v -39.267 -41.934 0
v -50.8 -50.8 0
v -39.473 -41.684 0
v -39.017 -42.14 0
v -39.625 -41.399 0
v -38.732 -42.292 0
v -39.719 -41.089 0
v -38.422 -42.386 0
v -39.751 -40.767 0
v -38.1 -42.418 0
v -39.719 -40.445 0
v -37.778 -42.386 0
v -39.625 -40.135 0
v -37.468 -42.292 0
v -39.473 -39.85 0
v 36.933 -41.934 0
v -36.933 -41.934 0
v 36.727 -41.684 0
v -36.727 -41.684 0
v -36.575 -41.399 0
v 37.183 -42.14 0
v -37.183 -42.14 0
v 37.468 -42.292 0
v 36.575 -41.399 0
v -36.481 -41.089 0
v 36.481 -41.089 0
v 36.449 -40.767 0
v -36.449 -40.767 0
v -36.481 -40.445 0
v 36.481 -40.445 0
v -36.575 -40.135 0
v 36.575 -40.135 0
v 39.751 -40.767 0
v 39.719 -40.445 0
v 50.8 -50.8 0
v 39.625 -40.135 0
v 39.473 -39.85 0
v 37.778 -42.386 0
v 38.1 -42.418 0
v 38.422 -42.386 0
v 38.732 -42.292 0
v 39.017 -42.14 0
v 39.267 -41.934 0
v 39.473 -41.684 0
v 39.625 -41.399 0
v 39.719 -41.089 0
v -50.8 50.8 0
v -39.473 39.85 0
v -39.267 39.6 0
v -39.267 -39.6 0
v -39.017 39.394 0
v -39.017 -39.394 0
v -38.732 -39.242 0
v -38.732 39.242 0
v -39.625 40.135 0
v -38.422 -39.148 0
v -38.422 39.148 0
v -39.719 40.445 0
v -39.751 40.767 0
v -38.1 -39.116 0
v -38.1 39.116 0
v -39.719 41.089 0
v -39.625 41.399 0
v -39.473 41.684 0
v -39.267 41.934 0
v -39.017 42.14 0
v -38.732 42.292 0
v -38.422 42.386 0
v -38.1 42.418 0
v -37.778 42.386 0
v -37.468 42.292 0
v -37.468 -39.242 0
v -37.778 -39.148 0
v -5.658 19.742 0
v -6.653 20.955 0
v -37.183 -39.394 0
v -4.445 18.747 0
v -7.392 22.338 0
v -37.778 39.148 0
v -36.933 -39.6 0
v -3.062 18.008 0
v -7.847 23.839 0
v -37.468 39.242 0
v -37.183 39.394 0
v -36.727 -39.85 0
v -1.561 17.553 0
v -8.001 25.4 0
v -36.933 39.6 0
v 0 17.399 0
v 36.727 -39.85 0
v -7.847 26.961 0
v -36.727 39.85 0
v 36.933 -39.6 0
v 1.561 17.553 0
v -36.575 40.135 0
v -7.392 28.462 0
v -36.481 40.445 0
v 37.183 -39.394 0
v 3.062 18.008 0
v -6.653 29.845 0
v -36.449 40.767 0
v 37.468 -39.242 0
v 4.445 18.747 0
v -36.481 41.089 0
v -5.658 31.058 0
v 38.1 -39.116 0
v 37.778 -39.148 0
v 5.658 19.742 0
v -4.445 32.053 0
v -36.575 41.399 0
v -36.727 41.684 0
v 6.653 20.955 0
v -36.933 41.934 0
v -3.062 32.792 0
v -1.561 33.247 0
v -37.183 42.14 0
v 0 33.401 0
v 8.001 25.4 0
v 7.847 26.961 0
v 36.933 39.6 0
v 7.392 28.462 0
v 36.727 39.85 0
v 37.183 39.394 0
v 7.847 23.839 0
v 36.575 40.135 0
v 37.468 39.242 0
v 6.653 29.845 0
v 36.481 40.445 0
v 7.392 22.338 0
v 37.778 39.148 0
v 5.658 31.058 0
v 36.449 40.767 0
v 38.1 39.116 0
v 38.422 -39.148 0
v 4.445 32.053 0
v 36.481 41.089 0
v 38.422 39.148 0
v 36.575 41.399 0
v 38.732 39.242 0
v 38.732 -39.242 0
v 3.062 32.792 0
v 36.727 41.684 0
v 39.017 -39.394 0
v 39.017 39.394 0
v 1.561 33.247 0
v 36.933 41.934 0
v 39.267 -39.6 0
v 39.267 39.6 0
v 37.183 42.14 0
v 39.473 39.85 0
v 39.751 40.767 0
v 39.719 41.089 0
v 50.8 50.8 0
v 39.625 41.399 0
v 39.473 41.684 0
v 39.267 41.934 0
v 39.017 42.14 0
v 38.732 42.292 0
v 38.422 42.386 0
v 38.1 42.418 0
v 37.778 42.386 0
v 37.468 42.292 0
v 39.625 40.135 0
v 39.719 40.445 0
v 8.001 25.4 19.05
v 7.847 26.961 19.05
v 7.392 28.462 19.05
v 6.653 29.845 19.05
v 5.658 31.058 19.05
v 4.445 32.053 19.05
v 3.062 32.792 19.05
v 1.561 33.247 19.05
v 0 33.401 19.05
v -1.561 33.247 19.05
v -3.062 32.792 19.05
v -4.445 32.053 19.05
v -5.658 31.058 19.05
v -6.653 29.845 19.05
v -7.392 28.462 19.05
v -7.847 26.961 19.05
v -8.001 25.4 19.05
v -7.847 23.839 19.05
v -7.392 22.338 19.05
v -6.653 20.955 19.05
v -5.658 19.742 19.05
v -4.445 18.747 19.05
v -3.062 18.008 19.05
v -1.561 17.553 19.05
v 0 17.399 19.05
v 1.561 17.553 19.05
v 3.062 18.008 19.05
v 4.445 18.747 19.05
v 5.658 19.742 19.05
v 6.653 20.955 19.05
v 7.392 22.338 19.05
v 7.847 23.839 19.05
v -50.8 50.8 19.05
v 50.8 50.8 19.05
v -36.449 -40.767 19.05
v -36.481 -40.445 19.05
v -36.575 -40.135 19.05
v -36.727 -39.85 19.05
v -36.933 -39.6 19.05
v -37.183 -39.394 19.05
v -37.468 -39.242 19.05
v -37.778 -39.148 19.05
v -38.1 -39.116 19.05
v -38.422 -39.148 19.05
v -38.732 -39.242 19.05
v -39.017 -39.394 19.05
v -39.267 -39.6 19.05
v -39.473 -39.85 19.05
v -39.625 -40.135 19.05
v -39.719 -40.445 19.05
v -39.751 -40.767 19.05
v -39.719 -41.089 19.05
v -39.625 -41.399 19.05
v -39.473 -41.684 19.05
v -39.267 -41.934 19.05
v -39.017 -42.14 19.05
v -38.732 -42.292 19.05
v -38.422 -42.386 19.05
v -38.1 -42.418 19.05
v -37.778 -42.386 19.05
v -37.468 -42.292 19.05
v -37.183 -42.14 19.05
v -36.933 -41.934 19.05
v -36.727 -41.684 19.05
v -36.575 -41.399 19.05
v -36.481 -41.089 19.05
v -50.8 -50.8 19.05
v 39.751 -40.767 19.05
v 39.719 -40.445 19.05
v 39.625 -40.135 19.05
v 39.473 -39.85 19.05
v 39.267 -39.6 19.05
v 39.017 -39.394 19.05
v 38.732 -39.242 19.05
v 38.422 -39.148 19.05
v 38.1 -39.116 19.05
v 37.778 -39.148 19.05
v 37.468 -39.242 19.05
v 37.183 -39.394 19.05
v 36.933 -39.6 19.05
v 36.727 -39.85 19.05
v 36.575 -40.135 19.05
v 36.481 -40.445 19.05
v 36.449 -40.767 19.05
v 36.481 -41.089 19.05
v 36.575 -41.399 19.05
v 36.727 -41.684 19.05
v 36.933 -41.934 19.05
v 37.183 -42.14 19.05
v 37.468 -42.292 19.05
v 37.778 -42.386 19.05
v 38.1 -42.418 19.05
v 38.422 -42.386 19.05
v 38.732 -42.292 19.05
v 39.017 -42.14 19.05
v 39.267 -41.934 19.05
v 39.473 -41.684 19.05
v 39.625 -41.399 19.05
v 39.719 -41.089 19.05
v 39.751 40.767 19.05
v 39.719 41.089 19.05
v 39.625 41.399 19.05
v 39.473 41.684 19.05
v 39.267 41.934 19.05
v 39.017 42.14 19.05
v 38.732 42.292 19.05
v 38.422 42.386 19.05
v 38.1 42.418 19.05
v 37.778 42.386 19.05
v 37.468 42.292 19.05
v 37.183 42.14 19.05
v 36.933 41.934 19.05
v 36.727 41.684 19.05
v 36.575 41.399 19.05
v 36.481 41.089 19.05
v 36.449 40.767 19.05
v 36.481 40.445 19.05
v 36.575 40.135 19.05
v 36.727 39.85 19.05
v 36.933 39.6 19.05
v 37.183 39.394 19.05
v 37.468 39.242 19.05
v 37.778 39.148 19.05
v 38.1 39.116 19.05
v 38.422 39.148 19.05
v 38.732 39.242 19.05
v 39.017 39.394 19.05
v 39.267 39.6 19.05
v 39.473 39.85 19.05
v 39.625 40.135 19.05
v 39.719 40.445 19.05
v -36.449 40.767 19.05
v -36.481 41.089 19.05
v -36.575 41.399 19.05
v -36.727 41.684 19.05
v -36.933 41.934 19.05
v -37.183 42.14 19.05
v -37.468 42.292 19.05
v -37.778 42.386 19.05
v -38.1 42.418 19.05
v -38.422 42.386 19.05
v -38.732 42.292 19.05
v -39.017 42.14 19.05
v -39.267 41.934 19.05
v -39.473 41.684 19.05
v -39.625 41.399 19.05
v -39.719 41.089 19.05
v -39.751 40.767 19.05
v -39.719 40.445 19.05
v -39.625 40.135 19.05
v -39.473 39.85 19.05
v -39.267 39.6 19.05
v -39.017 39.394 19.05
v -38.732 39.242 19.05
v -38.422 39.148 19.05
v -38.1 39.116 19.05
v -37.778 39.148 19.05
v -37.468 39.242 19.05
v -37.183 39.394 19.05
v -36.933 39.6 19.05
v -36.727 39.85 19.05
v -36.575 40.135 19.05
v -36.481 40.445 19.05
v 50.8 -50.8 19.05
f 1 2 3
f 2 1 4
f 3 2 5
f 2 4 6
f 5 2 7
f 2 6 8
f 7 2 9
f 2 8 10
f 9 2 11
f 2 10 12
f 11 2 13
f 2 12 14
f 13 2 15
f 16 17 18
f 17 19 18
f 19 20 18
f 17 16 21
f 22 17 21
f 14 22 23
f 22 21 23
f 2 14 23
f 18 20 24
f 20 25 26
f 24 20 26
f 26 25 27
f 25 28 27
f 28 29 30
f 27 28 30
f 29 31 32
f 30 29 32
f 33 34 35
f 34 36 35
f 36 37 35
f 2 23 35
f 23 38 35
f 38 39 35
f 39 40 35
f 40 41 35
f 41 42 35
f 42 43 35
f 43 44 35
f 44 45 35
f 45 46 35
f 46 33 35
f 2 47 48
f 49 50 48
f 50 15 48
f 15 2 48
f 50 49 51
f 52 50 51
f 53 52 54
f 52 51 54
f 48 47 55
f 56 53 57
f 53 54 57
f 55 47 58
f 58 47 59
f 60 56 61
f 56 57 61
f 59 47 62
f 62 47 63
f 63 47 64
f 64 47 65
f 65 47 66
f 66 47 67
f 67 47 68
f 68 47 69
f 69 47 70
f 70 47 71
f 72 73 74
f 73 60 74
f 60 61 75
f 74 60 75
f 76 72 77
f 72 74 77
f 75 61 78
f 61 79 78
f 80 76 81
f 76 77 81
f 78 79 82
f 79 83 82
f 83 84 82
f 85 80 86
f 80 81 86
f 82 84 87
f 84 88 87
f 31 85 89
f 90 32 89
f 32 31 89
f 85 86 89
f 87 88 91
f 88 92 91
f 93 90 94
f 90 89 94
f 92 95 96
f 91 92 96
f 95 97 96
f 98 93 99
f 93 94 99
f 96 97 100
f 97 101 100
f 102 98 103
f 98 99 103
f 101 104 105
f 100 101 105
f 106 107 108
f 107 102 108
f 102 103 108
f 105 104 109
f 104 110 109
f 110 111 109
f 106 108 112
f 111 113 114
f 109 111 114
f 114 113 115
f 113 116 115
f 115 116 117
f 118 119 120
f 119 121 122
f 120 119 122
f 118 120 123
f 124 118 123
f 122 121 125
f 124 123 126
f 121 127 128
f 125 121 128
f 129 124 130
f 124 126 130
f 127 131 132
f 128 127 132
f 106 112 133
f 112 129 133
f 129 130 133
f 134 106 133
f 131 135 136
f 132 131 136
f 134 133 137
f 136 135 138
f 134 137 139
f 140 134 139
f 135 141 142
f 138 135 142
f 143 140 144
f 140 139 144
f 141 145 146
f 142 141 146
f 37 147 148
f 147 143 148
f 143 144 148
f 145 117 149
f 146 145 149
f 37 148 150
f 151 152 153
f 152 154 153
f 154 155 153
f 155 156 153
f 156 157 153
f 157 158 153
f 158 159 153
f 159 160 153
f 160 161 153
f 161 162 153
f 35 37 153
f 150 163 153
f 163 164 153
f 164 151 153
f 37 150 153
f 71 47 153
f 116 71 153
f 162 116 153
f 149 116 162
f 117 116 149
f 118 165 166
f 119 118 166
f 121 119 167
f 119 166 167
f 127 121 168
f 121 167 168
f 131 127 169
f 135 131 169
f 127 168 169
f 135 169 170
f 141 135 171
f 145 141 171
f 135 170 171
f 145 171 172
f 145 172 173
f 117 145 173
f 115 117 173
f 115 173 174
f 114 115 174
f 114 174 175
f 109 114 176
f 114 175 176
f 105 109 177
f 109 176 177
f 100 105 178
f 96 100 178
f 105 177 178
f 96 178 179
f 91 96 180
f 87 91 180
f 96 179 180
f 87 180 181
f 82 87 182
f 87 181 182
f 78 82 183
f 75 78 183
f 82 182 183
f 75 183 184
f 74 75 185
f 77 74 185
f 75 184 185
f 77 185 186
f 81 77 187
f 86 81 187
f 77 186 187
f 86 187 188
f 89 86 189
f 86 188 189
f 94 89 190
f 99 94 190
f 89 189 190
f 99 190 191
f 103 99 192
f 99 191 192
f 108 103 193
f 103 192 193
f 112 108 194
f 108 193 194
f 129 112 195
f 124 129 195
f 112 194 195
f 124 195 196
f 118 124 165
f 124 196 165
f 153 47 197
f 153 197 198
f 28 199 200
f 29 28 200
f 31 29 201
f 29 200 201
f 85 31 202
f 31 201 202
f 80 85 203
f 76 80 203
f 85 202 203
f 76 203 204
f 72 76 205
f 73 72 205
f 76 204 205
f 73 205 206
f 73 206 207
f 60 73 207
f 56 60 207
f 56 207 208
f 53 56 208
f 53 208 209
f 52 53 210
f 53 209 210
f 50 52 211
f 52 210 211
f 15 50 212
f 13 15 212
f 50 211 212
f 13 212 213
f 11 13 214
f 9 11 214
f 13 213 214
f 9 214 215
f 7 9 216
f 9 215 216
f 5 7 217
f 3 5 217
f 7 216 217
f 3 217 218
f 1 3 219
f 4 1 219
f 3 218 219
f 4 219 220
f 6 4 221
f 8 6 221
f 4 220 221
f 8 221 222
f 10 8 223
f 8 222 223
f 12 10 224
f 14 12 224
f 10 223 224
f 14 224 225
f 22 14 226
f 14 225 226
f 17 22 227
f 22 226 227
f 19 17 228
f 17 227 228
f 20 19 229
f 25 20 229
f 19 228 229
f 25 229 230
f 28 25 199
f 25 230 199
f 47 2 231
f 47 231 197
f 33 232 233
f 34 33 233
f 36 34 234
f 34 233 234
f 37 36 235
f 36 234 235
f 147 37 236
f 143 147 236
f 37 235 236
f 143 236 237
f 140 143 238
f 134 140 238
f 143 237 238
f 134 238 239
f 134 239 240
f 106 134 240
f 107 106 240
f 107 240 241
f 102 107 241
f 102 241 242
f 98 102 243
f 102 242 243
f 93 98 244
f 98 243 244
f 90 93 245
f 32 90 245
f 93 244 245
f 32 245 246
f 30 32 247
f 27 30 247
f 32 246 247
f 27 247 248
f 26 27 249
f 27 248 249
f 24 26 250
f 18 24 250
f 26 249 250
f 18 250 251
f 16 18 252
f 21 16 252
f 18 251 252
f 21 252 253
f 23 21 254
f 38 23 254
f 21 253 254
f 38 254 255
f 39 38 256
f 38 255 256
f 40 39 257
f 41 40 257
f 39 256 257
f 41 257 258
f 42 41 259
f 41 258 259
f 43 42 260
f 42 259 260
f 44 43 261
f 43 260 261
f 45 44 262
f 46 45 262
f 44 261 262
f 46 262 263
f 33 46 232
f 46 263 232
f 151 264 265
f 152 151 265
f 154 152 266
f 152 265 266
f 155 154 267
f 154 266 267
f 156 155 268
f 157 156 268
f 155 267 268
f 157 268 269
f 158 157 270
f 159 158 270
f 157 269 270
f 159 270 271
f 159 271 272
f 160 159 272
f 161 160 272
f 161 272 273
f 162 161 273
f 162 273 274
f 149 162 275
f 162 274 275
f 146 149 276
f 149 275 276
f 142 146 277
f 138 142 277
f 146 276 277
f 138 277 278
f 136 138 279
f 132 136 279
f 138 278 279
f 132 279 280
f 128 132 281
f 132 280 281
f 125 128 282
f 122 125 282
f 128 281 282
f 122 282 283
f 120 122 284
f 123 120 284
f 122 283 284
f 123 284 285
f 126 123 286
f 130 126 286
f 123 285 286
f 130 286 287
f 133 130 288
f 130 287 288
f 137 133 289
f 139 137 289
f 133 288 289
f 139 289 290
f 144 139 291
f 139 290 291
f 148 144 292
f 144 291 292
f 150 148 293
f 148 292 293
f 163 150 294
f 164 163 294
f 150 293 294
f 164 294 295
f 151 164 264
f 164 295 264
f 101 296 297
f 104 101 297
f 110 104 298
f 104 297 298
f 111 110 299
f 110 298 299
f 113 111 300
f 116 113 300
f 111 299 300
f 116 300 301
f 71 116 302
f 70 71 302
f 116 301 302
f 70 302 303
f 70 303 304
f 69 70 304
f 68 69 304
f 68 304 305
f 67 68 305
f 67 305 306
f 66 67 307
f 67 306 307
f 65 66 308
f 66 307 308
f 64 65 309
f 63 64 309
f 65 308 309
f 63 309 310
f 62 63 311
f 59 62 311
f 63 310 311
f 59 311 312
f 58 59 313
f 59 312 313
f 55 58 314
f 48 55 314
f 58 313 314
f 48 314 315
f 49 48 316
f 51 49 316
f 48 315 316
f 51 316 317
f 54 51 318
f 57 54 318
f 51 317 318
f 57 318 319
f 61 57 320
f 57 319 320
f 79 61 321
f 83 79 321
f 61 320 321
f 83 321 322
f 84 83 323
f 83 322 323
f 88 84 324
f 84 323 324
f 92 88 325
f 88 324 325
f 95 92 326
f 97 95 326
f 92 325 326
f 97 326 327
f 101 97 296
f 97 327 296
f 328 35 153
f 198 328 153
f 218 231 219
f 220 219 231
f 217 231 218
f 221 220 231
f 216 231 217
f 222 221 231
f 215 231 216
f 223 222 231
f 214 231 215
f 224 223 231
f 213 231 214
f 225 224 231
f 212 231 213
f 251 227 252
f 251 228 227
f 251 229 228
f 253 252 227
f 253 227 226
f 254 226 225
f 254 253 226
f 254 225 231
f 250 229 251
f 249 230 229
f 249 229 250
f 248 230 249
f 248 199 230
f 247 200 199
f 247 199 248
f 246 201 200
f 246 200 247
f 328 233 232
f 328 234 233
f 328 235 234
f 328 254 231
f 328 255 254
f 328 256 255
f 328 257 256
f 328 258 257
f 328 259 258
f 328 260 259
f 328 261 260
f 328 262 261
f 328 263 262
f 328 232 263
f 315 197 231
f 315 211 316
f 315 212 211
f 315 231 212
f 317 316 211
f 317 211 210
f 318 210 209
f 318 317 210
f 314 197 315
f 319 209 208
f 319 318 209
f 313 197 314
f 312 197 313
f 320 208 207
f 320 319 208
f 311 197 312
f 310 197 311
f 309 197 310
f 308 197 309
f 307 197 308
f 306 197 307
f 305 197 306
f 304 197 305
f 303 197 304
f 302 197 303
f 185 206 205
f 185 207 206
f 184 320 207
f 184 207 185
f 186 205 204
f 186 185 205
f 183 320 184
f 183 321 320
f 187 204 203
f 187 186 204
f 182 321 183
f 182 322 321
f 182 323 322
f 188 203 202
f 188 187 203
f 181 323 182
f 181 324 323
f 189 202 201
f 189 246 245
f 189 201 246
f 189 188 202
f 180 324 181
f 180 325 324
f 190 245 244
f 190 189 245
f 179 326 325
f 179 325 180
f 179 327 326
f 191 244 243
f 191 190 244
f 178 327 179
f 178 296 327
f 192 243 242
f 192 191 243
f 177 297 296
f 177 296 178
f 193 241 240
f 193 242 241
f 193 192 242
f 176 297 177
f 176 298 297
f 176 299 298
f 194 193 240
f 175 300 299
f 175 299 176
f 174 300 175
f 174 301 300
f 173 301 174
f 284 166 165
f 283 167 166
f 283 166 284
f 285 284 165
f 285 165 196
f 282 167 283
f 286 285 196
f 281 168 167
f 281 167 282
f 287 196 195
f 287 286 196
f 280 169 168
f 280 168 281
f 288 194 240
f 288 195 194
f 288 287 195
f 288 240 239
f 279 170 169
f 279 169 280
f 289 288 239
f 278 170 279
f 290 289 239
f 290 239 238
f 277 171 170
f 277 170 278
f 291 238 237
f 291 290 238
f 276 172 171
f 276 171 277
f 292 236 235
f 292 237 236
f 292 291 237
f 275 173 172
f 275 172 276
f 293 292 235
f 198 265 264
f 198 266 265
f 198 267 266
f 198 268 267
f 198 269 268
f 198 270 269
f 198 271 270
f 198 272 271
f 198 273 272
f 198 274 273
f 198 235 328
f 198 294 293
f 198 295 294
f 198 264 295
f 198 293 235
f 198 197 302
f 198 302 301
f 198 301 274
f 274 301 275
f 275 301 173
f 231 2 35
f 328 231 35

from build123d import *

# Parameters (mm, degrees)
SKETCH1_W           = 101.6
SKETCH1_H           = 101.6
BOSS_EXTRUDE1_DEPTH = 19.05
SKETCH2_R           = 8.001
CUT_EXTRUDE1_DEPTH  = 19.05
SKETCH3_R           = 1.651
CUT_EXTRUDE2_DEPTH  = 19.05
SKETCH4_R           = 1.651
CUT_EXTRUDE3_DEPTH  = 19.05


with BuildPart() as part:
    # Sketch1 → Boss-Extrude1 (new body)
    with BuildSketch(Plane.XY):
        Rectangle(SKETCH1_W, SKETCH1_H)
    extrude(amount=BOSS_EXTRUDE1_DEPTH)

    # Sketch2 → Cut-Extrude1 (cut)
    with BuildSketch(Plane.XY.offset(19.05)):
        with Locations((0, 25.4)):
            Circle(SKETCH2_R)
    extrude(amount=-CUT_EXTRUDE1_DEPTH, mode=Mode.SUBTRACT)

    # Sketch3 → Cut-Extrude2 (cut)
    with BuildSketch(Plane.XY.offset(19.05)):
        with Locations((-38.1, -40.767)):
            Circle(SKETCH3_R)
    extrude(amount=-CUT_EXTRUDE2_DEPTH, mode=Mode.SUBTRACT)

    # Sketch4 → Cut-Extrude3 (cut)
    with BuildSketch(Plane.XY.offset(19.05)):
        with Locations((-38.1, 40.767)):
            Circle(SKETCH4_R)
        with Locations((38.1, 40.767)):
            Circle(SKETCH4_R)
        with Locations((38.1, -40.767)):
            Circle(SKETCH4_R)
    extrude(amount=-CUT_EXTRUDE3_DEPTH, mode=Mode.SUBTRACT)


solid = part.part
